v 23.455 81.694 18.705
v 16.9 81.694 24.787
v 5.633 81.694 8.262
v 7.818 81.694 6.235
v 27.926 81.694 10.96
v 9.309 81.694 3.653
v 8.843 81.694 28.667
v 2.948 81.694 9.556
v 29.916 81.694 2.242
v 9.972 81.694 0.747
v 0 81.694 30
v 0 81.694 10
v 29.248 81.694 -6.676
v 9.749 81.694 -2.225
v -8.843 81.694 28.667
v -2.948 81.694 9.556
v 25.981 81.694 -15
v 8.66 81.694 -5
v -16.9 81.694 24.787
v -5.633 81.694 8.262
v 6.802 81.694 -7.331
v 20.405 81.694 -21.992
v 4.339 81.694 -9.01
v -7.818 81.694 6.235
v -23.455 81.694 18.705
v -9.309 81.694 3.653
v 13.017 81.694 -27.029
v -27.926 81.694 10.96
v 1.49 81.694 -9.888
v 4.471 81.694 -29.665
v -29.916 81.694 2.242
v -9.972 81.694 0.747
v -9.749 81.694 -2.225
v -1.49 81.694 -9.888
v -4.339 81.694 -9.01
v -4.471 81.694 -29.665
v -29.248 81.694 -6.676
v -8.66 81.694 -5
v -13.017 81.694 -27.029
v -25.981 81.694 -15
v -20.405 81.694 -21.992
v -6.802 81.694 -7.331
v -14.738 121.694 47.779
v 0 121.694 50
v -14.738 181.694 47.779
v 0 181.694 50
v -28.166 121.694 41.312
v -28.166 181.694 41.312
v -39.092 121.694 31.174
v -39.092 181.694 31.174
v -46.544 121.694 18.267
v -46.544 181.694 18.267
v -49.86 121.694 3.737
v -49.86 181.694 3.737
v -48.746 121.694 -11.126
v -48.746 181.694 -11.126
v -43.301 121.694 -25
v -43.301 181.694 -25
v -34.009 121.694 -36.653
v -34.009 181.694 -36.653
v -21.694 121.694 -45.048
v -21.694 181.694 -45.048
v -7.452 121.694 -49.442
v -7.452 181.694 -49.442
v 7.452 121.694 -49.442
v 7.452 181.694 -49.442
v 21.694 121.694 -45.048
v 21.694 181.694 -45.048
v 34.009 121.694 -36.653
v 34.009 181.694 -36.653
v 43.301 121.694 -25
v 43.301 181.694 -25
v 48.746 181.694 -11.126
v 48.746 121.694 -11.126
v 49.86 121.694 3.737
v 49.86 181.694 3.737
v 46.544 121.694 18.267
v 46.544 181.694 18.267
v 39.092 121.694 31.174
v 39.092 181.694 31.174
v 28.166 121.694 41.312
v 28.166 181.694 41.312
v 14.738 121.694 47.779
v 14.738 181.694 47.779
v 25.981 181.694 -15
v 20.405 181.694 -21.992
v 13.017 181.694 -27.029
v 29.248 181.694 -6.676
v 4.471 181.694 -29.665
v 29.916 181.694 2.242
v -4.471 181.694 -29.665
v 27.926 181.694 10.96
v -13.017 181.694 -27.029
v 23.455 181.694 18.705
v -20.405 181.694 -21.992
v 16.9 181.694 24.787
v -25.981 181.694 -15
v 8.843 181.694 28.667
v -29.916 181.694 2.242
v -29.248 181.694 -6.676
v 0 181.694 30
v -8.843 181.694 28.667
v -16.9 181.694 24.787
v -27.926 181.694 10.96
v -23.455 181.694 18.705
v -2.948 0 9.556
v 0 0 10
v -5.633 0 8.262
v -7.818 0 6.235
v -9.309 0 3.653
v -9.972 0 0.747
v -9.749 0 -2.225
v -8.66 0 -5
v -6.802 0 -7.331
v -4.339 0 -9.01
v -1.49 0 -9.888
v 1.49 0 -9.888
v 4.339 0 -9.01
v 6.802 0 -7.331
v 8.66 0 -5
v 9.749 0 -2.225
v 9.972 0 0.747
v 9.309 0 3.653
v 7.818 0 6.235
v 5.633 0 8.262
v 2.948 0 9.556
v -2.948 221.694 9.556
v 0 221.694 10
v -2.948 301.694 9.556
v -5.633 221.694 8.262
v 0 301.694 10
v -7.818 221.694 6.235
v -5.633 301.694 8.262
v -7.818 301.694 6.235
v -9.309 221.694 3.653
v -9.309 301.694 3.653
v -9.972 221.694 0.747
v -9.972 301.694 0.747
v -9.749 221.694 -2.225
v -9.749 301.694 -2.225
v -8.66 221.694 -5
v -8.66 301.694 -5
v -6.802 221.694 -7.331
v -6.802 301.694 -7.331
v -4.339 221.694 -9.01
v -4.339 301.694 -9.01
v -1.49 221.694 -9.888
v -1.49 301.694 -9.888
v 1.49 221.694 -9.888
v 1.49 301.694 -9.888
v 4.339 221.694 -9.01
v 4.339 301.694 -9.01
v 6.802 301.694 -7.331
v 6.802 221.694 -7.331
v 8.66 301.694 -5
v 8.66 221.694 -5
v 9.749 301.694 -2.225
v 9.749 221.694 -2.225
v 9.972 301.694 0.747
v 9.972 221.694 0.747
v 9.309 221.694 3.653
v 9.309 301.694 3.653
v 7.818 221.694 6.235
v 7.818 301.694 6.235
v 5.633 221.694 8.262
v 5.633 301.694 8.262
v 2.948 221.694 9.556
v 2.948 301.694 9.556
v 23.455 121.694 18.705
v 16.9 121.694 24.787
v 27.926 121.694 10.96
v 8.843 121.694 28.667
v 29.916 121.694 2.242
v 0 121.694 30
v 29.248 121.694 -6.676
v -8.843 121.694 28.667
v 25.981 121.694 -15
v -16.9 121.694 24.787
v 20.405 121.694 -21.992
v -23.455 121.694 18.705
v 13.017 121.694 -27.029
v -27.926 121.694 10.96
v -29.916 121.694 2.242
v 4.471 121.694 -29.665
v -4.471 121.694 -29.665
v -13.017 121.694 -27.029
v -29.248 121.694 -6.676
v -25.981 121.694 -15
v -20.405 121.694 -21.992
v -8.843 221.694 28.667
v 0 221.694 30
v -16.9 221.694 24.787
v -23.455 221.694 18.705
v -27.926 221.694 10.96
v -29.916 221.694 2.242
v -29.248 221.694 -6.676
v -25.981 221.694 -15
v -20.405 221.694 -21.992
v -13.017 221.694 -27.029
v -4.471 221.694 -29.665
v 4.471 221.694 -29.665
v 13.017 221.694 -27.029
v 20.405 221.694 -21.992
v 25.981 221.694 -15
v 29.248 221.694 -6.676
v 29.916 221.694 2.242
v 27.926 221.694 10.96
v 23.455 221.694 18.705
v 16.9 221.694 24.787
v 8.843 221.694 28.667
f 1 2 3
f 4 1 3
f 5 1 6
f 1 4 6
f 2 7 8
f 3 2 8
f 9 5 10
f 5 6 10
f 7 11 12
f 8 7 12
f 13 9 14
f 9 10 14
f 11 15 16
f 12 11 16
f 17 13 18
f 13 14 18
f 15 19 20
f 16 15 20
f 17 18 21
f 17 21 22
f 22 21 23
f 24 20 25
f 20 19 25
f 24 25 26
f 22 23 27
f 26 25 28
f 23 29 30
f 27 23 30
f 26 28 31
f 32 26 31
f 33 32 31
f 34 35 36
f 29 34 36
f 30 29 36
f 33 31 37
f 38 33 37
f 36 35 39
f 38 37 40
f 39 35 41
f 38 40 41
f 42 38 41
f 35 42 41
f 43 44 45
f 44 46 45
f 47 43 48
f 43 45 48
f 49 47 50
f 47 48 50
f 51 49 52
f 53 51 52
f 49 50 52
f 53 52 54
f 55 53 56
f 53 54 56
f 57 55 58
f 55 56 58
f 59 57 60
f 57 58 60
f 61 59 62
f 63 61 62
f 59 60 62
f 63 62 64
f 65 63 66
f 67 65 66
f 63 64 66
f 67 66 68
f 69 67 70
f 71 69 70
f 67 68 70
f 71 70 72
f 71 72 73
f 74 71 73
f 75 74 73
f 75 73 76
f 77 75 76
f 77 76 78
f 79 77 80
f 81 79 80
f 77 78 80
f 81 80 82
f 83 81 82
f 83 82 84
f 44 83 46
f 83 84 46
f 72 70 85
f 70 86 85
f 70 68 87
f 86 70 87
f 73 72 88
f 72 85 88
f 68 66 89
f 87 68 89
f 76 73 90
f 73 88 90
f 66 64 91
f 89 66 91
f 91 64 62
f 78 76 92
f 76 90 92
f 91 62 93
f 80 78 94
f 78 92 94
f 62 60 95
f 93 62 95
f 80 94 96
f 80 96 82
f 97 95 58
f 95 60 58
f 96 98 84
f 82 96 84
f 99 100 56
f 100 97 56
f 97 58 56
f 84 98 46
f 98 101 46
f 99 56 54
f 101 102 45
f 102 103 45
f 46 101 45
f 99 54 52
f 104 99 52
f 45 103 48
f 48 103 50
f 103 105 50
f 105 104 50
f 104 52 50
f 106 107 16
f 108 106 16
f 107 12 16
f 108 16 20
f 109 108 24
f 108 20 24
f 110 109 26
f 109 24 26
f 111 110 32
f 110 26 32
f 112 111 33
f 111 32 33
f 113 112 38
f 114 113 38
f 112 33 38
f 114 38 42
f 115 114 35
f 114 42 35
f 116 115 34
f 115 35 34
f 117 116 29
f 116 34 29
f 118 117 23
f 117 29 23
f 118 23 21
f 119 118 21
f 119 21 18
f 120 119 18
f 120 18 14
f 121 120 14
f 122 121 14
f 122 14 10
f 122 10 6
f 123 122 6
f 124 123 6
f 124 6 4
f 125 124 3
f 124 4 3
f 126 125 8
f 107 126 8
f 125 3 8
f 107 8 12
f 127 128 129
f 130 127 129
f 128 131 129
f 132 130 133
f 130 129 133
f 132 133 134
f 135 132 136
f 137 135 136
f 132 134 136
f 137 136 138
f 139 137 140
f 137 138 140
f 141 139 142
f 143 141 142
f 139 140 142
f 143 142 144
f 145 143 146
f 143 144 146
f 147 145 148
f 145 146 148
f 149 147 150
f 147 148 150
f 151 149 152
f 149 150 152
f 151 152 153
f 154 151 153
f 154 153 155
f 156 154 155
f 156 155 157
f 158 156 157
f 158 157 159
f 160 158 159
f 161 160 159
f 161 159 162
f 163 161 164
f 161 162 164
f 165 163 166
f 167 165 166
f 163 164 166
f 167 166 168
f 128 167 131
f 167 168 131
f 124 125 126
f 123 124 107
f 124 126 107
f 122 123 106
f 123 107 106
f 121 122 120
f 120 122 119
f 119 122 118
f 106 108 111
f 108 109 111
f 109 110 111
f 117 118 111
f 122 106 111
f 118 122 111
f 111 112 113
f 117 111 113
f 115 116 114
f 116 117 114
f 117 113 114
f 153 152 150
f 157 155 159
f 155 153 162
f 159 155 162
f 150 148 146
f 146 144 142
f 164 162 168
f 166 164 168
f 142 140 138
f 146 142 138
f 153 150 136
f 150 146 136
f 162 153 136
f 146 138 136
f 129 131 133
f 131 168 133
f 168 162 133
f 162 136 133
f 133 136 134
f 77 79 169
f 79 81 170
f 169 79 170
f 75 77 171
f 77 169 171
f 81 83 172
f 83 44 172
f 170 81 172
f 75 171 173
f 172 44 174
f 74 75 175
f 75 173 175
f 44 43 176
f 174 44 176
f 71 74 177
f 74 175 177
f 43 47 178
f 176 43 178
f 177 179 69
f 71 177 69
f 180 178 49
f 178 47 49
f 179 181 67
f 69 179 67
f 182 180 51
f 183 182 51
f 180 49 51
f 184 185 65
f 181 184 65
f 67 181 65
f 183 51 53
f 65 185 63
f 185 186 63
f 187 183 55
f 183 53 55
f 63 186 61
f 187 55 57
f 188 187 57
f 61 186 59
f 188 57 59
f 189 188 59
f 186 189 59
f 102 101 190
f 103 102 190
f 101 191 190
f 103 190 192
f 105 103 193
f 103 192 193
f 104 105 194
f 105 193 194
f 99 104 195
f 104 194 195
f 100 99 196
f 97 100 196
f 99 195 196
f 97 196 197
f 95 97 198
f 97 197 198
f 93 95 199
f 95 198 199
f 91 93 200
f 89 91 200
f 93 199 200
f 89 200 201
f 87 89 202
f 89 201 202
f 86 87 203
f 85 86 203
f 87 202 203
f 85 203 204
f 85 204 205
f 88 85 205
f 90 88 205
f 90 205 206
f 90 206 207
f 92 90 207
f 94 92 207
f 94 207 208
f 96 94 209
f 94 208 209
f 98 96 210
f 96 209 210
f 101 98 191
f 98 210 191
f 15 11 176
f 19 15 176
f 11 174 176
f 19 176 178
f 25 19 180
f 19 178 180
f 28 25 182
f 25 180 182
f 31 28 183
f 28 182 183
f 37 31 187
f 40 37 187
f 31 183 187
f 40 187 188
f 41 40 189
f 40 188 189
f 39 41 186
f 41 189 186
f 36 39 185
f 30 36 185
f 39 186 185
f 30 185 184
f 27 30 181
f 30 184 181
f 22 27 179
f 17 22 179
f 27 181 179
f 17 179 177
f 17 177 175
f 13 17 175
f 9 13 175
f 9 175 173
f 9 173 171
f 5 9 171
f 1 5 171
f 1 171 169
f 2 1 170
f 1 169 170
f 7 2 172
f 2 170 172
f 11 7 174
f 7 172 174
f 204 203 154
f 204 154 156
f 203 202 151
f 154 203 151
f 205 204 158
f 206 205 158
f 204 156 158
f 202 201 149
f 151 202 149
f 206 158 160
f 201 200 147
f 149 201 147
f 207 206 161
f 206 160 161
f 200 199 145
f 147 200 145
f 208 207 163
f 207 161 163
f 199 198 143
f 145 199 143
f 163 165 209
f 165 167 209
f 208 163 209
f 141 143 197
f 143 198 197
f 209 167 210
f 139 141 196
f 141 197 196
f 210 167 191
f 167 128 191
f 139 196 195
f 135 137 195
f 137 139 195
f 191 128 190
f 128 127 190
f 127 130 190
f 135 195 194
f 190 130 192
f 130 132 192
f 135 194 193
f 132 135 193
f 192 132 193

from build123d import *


with BuildPart() as part:
    # Sketch1 → Revolve1 (revolve)
    with BuildSketch(Plane.XY, mode=Mode.PRIVATE) as revolve1_sk:
        Polygon((0, 0), (10, 0), (10, 1.693933425), (10, 81.693933425), (30, 81.693933425), (30, 121.693933425), (50, 121.693933425), (50, 181.693933425), (30, 181.693933425), (30, 221.693933425), (10, 221.693933425), (10, 301.693933425), (0, 301.693933425), align=None)
    revolve(revolve1_sk.sketch.rotate(Axis((0, 99.4903565, 0), (0, -1, 0)), 90), axis=Axis((0, 99.4903565, 0), (0, -1, 0)))  # turned: the seam where the file's is


solid = part.part
